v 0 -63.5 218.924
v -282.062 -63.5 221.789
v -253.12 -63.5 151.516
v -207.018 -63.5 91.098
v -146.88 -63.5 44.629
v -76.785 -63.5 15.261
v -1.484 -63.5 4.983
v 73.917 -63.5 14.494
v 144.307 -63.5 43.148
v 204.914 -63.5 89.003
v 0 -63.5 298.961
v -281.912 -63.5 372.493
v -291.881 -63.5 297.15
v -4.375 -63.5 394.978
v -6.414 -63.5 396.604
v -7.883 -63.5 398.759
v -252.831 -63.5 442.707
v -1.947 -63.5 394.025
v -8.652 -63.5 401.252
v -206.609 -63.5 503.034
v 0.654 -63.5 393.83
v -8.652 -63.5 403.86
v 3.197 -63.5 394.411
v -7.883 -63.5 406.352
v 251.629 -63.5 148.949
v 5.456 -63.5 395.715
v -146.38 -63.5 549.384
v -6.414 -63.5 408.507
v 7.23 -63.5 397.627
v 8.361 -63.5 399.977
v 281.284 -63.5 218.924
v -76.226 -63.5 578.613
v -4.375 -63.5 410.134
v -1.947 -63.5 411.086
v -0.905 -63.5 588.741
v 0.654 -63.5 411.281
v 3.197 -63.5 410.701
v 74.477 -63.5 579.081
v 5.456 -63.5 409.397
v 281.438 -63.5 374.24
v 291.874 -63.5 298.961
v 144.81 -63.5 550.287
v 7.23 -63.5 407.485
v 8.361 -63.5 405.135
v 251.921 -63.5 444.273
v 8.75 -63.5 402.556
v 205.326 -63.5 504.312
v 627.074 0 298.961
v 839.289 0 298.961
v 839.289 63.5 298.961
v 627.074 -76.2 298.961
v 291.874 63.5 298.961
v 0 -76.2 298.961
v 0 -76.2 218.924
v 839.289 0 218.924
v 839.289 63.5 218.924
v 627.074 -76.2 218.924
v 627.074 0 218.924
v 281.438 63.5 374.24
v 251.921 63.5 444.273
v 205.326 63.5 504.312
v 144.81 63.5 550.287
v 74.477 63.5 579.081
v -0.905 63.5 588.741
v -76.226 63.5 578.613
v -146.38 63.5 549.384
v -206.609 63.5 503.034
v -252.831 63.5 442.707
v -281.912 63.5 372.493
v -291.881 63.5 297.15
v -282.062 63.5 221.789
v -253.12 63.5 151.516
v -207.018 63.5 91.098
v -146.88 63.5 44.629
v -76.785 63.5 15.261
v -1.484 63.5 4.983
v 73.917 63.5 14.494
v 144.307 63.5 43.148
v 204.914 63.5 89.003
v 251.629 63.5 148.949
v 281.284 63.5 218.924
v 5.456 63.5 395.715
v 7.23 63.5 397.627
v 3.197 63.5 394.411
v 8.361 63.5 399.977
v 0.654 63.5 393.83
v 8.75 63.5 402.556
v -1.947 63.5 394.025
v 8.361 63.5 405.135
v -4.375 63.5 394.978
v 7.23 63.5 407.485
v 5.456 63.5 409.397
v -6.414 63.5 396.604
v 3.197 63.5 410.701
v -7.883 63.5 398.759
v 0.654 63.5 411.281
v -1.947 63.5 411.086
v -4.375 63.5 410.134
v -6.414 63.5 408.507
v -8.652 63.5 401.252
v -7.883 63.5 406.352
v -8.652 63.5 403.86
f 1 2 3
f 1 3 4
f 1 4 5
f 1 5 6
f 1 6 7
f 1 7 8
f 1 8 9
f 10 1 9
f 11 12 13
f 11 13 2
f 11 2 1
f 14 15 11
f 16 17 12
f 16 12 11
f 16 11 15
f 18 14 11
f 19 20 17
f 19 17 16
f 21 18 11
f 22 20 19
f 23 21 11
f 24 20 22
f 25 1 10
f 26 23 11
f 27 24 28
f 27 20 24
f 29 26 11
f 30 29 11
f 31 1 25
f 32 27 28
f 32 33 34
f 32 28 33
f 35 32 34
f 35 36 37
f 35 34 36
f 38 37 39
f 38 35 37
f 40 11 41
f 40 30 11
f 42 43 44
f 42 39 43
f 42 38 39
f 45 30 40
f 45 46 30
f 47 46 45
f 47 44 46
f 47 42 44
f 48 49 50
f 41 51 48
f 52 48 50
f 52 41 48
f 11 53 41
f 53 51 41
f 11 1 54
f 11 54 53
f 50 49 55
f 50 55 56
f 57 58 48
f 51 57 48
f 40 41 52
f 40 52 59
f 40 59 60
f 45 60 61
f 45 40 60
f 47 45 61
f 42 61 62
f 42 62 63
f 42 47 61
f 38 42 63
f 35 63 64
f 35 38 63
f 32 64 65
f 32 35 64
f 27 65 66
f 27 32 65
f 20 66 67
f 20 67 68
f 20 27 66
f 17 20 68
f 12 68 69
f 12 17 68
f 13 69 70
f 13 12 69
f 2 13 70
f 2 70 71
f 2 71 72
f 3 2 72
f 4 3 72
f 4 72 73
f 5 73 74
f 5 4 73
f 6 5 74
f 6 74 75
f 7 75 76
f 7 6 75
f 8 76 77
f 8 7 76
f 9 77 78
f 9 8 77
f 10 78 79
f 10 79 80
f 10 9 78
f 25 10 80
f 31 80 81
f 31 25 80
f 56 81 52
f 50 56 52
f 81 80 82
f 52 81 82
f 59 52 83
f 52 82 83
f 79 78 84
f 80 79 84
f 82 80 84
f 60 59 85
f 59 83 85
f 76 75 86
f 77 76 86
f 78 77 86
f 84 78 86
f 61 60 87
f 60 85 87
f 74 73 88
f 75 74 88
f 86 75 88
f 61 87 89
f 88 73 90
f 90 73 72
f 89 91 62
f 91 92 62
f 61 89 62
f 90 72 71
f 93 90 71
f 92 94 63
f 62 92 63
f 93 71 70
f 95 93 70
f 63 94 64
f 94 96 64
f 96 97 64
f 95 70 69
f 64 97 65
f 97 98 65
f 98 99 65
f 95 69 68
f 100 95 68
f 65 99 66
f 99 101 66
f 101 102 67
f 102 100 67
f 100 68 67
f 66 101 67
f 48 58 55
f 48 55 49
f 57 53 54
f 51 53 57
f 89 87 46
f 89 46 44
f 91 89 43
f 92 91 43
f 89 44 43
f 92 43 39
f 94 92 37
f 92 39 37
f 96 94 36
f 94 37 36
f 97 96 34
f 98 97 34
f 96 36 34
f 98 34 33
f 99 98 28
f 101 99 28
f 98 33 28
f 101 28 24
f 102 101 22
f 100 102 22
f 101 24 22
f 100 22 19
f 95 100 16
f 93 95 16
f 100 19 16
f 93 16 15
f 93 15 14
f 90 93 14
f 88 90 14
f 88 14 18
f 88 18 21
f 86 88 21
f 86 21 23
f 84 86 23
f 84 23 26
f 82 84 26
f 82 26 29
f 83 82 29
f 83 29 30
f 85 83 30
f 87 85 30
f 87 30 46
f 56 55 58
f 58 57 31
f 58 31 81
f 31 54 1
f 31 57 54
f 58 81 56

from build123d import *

# Parameters (mm, degrees)
F2_DEPTH = 63.5
F0_W     = 627.0736455917
F0_H     = 80.0375938416
F3_DEPTH = 76.2
F5_D     = 17.5
F6_W     = 63.5
F6_H     = 80.0375938416
F7_DEPTH = 839.2885923386


with BuildPart() as f2:
    # F1 (on face) → F2 (new body, symmetric)
    with BuildSketch(Plane.XZ):
        with BuildLine():
            Line((0, 298.9611625671), (291.8738404898, 298.9611625671))
            ThreePointArc((291.8738404898, 298.9611625671), (-289.3594591256, 335.1473667086), (281.2837032222, 218.9235687256))
            Line((281.2837032222, 218.9235687256), (0, 218.9235687256))
            Line((0, 218.9235687256), (0, 298.9611625671))
        make_face()
    extrude(amount=F2_DEPTH, both=True)

    # F0 (on Front) → F3 (join)
    with BuildSketch(Plane.XZ):
        with Locations((313.5368227959, 258.9423656464)):
            Rectangle(F0_W, F0_H)
    extrude(amount=F3_DEPTH)

    # F5 (through all)
    with Locations(Plane(origin=(0, 63.5, 0), x_dir=(-1, 0, 0), z_dir=(0, 1, 0))):
        with Locations((0, 402.5558233261)):
            Hole(F5_D / 2)

    # F6 (on face) → F7 (join)
    with BuildSketch(Plane.YZ):
        with Locations((31.75, 258.9423656464)):
            Rectangle(F6_W, F6_H)
    extrude(amount=F7_DEPTH)


solid = f2.part
